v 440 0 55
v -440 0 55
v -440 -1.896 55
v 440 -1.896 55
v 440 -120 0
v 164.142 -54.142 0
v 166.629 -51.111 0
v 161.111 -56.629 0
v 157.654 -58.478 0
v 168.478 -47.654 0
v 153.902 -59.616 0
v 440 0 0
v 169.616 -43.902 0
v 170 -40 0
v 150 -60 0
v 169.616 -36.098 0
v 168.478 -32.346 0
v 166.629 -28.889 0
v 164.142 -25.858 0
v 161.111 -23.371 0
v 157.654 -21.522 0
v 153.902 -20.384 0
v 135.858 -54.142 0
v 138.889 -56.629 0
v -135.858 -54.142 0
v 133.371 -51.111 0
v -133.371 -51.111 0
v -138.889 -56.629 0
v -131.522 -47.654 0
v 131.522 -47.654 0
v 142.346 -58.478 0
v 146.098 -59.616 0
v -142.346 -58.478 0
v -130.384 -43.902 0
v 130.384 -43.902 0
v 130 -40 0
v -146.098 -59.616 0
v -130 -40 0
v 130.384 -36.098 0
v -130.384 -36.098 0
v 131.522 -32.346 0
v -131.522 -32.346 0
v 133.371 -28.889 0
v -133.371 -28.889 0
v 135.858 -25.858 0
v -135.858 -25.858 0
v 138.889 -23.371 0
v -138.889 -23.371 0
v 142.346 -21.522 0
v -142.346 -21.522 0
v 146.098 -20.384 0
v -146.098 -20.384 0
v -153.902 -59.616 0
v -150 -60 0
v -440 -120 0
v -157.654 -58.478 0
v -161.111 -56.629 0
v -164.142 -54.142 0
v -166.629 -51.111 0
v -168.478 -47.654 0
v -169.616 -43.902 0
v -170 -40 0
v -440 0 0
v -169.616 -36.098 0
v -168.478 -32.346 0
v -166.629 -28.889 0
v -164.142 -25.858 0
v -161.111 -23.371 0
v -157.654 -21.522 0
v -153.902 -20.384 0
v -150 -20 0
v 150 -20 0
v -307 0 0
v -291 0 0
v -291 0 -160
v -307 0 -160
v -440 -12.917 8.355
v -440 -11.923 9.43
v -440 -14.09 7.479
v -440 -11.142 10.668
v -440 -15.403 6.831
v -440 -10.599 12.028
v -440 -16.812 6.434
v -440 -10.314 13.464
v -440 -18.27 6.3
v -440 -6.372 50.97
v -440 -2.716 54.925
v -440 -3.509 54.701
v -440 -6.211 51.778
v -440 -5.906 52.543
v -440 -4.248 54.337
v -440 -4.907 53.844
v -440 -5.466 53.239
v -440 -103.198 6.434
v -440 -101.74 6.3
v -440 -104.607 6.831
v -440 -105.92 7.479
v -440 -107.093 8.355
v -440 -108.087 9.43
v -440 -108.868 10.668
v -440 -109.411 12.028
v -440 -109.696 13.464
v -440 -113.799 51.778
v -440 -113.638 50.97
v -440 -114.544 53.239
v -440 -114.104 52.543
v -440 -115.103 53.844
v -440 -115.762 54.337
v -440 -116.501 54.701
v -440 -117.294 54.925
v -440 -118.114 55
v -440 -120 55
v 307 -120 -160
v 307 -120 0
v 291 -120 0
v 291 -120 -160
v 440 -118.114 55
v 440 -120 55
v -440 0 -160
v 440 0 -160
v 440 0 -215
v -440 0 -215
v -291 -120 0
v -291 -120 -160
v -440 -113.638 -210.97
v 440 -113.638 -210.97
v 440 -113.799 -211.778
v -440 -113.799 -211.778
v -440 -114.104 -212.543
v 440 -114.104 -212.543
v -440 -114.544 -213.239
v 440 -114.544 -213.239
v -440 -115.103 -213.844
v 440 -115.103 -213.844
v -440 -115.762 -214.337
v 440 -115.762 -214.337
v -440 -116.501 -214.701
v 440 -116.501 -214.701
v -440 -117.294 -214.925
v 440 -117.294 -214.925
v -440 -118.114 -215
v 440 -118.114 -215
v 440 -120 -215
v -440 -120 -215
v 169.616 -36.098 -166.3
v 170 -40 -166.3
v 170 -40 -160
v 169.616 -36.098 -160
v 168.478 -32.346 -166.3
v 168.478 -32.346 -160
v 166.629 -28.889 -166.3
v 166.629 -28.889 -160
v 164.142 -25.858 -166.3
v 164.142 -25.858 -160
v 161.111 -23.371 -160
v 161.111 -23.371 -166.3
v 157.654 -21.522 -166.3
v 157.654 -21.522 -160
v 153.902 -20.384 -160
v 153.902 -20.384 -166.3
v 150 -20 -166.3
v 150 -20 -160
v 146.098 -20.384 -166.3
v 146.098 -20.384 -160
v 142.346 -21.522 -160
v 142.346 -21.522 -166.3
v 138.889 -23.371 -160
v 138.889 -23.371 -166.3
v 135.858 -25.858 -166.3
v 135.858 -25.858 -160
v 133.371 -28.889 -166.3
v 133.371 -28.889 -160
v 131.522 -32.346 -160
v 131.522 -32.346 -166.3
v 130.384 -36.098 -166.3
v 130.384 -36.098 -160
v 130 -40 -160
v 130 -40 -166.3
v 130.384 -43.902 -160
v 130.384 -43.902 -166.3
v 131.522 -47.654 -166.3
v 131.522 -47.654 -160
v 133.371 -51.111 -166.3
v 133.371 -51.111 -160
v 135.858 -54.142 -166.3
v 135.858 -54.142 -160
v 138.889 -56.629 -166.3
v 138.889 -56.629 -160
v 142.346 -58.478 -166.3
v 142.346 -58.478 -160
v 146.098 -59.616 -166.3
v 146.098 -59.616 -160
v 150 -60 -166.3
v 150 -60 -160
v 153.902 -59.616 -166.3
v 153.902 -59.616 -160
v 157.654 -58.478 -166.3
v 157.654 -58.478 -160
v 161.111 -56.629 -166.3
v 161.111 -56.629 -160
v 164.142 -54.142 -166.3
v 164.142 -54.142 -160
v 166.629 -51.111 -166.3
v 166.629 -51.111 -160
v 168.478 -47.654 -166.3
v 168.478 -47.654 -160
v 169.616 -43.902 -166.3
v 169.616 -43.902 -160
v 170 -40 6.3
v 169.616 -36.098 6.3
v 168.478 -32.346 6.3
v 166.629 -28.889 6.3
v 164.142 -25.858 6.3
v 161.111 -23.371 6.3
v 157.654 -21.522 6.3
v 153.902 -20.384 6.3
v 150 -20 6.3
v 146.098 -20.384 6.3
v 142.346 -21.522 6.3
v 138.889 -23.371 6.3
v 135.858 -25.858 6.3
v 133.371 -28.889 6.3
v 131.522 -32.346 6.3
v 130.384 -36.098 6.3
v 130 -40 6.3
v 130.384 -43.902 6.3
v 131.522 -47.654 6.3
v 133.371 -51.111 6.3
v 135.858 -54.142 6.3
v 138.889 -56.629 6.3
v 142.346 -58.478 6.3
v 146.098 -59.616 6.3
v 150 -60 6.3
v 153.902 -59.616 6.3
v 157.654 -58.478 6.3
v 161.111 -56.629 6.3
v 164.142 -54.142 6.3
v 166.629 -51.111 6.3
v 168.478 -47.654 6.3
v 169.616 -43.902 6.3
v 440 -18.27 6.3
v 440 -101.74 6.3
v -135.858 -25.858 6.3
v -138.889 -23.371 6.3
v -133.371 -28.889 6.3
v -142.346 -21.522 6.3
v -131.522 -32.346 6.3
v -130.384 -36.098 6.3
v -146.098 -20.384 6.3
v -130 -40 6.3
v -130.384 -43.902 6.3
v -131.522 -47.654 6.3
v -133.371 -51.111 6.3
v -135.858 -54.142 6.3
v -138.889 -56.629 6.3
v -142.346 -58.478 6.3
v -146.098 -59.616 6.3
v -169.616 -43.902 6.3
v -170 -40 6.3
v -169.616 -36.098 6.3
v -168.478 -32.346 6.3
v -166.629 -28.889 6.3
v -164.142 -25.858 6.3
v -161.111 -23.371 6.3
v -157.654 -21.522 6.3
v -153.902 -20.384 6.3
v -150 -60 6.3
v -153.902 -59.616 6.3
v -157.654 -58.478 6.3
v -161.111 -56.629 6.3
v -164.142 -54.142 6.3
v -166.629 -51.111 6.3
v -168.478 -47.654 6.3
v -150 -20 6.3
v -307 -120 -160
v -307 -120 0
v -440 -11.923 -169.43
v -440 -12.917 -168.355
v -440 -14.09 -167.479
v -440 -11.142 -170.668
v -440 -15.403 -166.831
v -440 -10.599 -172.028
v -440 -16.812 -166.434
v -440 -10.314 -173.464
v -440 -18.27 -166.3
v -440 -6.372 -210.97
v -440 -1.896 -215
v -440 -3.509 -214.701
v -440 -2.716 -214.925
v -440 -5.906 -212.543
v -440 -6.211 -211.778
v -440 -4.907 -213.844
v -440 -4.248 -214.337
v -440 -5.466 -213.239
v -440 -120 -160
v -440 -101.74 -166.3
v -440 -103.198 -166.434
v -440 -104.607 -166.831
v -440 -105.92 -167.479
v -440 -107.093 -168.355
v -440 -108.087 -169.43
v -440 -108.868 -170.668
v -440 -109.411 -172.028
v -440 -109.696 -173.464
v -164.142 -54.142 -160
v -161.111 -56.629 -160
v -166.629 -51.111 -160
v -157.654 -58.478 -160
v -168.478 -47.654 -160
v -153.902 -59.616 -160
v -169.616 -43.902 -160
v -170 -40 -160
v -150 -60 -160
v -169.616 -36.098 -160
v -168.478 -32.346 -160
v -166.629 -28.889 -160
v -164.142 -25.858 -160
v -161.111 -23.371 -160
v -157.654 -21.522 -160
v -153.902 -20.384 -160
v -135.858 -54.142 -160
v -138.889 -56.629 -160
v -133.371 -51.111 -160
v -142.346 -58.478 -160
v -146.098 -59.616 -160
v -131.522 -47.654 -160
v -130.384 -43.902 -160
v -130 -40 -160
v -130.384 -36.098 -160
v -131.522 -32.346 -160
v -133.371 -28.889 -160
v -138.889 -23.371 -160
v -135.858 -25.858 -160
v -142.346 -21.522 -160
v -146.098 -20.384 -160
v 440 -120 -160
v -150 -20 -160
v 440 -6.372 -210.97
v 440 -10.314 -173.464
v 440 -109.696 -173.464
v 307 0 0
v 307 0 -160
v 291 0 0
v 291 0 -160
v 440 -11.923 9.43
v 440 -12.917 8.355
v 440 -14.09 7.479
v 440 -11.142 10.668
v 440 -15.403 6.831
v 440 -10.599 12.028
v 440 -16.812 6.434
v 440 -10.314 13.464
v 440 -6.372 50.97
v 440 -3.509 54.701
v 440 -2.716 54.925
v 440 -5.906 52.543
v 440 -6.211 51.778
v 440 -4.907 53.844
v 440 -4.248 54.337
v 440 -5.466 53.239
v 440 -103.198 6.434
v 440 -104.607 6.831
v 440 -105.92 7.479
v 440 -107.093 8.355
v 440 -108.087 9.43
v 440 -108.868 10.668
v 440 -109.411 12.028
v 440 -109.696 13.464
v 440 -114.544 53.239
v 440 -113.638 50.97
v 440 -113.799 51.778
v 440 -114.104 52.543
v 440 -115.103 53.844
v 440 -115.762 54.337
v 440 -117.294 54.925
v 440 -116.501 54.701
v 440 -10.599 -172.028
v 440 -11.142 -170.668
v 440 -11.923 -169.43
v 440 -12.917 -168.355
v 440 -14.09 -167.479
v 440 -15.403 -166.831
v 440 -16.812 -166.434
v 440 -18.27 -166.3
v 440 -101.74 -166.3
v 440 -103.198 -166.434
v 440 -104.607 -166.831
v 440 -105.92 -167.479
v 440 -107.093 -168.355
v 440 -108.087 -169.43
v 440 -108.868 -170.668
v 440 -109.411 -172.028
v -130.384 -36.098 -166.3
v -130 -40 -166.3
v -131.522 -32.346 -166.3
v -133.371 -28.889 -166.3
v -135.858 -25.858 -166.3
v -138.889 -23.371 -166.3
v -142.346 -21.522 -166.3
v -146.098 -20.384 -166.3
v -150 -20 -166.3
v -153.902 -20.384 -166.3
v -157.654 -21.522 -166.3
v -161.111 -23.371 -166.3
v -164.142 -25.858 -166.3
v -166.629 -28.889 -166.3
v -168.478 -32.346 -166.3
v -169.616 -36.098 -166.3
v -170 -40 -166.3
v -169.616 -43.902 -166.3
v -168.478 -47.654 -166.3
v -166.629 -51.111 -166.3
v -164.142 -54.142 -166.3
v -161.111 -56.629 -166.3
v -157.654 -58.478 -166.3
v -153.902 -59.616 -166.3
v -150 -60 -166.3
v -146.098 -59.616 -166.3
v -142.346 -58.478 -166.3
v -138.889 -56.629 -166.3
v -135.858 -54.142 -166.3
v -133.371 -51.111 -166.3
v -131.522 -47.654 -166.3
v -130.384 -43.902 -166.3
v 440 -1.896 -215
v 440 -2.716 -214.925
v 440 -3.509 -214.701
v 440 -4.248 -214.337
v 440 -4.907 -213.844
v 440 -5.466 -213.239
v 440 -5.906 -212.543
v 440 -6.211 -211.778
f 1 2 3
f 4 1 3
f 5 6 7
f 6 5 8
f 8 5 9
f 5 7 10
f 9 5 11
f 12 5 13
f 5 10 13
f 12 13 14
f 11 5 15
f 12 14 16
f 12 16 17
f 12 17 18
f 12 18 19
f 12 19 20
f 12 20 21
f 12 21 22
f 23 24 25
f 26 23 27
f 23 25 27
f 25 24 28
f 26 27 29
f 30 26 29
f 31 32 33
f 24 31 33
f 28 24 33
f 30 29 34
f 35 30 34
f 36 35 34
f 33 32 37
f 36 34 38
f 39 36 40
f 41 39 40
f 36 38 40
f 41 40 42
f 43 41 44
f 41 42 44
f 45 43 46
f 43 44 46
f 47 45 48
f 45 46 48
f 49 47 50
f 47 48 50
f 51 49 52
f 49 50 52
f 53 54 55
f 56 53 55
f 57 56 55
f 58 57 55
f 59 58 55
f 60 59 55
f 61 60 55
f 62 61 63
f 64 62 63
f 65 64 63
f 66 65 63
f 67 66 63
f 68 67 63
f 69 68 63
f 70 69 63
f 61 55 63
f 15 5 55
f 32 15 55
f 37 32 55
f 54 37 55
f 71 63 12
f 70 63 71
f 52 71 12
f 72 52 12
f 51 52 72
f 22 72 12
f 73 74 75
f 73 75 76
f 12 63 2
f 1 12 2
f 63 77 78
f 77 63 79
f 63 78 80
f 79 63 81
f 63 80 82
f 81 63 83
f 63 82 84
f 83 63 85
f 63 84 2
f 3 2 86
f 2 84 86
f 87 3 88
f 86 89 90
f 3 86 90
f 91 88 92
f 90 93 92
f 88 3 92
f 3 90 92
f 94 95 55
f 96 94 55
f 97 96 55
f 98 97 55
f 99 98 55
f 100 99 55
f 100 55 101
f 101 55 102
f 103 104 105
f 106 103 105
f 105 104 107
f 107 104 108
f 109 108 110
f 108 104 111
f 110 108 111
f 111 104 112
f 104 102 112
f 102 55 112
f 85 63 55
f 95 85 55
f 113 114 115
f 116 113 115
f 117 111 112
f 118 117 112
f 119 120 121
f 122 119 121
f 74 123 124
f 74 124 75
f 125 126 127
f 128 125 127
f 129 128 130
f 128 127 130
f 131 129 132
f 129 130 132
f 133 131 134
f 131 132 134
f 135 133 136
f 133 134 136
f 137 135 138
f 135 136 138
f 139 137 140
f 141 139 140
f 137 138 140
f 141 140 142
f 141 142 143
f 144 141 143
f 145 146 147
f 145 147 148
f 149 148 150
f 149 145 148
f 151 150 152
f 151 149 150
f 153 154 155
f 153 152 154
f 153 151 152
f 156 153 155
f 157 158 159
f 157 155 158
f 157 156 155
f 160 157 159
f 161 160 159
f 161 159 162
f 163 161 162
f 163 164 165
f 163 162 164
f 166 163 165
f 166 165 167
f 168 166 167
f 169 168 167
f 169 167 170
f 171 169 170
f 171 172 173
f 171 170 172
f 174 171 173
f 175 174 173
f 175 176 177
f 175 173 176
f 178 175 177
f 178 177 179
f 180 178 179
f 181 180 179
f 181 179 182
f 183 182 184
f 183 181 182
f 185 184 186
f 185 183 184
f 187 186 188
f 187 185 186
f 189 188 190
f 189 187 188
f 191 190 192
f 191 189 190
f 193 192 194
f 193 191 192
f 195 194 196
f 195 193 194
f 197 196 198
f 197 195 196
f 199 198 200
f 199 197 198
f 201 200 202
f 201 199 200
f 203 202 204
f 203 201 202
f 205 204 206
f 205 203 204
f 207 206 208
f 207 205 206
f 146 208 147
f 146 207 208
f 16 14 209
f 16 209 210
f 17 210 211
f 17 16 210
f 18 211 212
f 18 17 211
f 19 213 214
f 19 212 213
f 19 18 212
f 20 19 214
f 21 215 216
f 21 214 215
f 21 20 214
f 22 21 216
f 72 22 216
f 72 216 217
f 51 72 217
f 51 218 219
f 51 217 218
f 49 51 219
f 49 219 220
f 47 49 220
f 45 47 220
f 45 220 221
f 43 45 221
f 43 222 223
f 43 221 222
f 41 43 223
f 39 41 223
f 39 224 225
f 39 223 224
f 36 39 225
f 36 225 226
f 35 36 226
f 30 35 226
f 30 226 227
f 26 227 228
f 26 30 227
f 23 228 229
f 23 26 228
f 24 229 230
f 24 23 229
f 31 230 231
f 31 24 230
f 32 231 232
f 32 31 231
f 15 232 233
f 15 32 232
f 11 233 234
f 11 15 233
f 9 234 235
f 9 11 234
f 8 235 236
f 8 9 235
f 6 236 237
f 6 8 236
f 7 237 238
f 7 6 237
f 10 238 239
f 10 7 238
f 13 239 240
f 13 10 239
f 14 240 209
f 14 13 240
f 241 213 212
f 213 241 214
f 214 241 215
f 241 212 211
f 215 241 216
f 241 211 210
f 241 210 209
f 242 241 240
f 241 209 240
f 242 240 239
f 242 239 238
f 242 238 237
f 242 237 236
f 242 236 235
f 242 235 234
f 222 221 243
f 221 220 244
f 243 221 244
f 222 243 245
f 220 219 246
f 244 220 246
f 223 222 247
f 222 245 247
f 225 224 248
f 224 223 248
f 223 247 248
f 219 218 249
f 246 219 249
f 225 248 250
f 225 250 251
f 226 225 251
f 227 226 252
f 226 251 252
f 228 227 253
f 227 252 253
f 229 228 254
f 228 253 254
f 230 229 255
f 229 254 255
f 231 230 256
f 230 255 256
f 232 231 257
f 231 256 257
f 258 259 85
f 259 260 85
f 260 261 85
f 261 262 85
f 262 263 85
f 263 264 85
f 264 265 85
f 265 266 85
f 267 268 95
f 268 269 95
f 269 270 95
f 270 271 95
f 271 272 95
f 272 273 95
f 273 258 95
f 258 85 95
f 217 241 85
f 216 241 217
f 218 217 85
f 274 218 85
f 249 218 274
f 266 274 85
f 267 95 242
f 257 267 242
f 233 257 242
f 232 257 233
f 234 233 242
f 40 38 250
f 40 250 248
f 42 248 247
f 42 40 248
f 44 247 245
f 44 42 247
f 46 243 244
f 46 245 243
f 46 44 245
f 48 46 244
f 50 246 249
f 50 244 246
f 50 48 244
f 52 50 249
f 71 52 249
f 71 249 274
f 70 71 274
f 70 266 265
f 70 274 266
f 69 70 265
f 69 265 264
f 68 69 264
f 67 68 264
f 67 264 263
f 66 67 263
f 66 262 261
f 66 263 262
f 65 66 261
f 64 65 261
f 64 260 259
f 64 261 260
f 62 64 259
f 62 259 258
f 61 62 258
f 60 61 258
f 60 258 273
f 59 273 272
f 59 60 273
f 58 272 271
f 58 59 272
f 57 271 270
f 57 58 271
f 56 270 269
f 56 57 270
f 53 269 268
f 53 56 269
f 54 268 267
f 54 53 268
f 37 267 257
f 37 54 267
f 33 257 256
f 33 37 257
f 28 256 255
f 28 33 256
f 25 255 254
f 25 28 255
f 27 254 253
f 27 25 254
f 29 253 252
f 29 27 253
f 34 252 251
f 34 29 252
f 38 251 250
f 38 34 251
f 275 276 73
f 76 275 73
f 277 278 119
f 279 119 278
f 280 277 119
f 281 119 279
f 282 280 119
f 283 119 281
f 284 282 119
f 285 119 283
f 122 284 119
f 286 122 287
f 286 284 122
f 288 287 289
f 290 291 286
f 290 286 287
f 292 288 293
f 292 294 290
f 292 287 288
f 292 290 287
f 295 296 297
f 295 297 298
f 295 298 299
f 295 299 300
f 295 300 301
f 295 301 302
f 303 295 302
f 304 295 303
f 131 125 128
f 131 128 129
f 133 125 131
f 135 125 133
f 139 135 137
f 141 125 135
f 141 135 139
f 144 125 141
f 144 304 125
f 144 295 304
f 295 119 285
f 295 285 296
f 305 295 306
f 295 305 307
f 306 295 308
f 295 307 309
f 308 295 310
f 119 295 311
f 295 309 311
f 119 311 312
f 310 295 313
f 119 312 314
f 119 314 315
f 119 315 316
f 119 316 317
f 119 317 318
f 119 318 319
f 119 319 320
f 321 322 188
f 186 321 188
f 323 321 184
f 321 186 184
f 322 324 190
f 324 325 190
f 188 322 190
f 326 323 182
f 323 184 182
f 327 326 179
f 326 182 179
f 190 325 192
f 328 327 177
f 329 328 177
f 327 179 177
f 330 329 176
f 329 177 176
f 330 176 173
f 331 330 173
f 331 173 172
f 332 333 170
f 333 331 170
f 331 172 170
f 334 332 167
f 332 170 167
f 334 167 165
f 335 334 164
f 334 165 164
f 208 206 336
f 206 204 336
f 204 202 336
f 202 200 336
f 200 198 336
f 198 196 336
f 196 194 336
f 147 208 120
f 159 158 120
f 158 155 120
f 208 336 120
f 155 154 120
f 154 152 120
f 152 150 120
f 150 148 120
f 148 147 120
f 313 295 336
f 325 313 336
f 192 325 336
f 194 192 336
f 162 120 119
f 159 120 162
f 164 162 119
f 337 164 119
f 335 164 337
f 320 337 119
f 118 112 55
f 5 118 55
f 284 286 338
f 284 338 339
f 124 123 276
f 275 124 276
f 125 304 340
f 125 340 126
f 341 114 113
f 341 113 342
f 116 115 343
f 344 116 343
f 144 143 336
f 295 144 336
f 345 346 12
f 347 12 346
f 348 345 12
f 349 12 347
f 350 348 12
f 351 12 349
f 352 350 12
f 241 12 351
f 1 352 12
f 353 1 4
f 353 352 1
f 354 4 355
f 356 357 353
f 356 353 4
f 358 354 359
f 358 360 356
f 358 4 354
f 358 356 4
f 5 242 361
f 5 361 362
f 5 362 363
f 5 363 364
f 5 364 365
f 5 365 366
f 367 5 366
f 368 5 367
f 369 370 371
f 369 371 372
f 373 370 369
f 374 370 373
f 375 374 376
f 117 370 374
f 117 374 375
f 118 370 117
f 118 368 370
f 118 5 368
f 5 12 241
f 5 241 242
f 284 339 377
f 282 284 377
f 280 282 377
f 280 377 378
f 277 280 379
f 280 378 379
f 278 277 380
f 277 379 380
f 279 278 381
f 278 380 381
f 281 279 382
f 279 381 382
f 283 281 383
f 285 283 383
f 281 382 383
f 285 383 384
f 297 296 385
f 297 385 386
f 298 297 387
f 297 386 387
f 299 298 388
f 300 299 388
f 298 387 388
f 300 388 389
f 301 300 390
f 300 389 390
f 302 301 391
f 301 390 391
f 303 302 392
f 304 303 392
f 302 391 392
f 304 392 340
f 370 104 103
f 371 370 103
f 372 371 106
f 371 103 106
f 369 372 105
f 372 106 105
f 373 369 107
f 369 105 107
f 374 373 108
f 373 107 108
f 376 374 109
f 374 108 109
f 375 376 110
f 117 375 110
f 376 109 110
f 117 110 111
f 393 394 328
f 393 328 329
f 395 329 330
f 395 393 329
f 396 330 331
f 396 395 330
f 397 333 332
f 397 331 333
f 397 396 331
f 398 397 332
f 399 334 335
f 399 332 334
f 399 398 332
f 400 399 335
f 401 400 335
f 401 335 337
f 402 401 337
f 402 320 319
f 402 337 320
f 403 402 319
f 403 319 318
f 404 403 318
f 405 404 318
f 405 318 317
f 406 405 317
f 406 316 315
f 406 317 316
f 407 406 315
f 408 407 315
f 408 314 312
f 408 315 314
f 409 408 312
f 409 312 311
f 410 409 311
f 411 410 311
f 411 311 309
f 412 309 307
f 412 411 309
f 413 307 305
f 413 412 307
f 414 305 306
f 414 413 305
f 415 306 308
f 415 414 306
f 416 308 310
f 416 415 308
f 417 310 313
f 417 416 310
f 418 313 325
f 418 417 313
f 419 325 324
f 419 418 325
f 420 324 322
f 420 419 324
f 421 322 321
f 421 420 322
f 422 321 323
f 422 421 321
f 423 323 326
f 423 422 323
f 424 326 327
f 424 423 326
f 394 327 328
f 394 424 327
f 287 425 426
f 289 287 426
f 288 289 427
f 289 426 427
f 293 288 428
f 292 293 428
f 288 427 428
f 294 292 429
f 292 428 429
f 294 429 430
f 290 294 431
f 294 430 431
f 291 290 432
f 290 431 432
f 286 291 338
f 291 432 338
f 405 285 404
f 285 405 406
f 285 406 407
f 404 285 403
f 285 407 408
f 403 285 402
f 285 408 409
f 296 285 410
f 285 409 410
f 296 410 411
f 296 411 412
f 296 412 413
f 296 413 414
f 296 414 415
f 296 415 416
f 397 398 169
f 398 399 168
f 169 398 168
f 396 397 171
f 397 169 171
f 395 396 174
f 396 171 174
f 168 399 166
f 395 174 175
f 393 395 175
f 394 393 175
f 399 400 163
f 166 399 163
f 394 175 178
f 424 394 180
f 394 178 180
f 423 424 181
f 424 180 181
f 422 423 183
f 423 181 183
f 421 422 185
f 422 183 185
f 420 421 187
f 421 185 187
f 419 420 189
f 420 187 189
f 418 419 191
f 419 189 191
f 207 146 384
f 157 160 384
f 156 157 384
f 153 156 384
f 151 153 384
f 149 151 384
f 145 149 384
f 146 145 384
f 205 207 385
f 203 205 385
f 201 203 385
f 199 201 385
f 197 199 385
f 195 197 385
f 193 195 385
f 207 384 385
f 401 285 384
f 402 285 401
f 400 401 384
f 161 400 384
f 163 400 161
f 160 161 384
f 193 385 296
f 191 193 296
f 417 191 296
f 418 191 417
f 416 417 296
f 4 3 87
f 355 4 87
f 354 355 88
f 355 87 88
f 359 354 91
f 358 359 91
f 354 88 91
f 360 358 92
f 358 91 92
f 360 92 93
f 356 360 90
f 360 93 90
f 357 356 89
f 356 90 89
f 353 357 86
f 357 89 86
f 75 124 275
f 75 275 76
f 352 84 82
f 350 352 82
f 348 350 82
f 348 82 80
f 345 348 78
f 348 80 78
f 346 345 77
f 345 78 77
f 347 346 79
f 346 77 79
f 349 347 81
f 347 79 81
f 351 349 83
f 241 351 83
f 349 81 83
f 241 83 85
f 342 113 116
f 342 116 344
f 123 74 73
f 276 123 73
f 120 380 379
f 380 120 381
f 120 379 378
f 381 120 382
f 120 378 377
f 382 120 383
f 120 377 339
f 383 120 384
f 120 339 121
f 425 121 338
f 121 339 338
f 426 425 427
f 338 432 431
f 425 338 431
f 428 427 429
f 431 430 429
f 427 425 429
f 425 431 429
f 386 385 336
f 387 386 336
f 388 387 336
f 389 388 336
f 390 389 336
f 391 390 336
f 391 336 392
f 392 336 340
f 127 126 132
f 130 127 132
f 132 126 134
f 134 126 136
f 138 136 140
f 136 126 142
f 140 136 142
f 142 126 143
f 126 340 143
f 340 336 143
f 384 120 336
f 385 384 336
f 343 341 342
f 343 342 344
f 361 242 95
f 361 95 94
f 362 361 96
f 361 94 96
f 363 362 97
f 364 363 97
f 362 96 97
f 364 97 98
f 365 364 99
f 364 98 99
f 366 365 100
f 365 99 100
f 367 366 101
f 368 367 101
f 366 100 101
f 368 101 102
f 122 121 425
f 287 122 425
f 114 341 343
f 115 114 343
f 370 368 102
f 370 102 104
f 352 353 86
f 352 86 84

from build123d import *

# Parameters (mm, degrees)
C_CHANNEL_120_X_12_1_DEPTH = 880
C_CHANNEL_120_X_12_2_DEPTH = 880
CUT_EXTRUDE3_DEPTH         = 507.925724342
CUT_EXTRUDE3_DEPTH_BACK    = 507.925724342
SKETCH18_R                 = 20
BOSS_EXTRUDE1_REACH        = 506.207
SKETCH19_W                 = 16
SKETCH19_H                 = 120


with BuildPart() as part:
    # Sketch13 → C channel 120 X 12(1) (new body)
    with BuildSketch(Plane(origin=(-440, 0, 0), x_dir=(0, 0, 1), z_dir=(1, 0, 0))):
        with BuildLine():
            Line((55, 120), (0, 120))
            Line((0, 120), (0, 0))
            Line((0, 0), (55, 0))
            Line((55, 0), (55, 1.896373189))
            ThreePointArc((55, 1.896373189), (53.844151715, 4.907460917), (50.970378085, 6.371721718))
            Line((50.970378085, 6.371721718), (13.463772294, 10.313824837))
            ThreePointArc((13.463772294, 10.313824837), (8.354841396, 12.916955149), (6.3, 18.27))
            Line((6.3, 18.27), (6.3, 101.74))
            ThreePointArc((6.3, 101.74), (8.354841396, 107.093044851), (13.463772294, 109.696175163))
            Line((13.463772294, 109.696175163), (50.970378085, 113.638278282))
            ThreePointArc((50.970378085, 113.638278282), (53.844151715, 115.102539083), (55, 118.113626811))
            Line((55, 118.113626811), (55, 120))
        make_face()
    extrude(amount=C_CHANNEL_120_X_12_1_DEPTH)


with BuildPart() as body_2:
    # Sketch16 → C channel 120 X 12(2) (new body)
    with BuildSketch(Plane(origin=(440, 0, -160), x_dir=(0, 0, -1), z_dir=(-1, 0, 0))):
        with BuildLine():
            Line((55, 120), (0, 120))
            Line((0, 120), (0, 0))
            Line((0, 0), (55, 0))
            Line((55, 0), (55, 1.896373189))
            ThreePointArc((55, 1.896373189), (53.844151715, 4.907460917), (50.970378085, 6.371721718))
            Line((50.970378085, 6.371721718), (13.463772294, 10.313824837))
            ThreePointArc((13.463772294, 10.313824837), (8.354841396, 12.916955149), (6.3, 18.27))
            Line((6.3, 18.27), (6.3, 101.74))
            ThreePointArc((6.3, 101.74), (8.354841396, 107.093044851), (13.463772294, 109.696175163))
            Line((13.463772294, 109.696175163), (50.970378085, 113.638278282))
            ThreePointArc((50.970378085, 113.638278282), (53.844151715, 115.102539083), (55, 118.113626811))
            Line((55, 118.113626811), (55, 120))
        make_face()
    extrude(amount=C_CHANNEL_120_X_12_2_DEPTH)


with BuildPart() as cut_extrude3_tool:
    # Sketch18 → Cut-Extrude3 (new, two sides: drawn at the far end of the back side and taken through both)
    with BuildSketch(Plane.XY.offset(6.3).offset(-CUT_EXTRUDE3_DEPTH_BACK)):
        with Locations((-150, -40)):
            Circle(SKETCH18_R)
        with Locations((150, -40)):
            Circle(SKETCH18_R)
    extrude(amount=CUT_EXTRUDE3_DEPTH + CUT_EXTRUDE3_DEPTH_BACK)


with BuildPart() as part_1:
    add(part.part)

    # Cut-Extrude3: cut by cut_extrude3_tool
    add(cut_extrude3_tool.part, mode=Mode.SUBTRACT)


with BuildPart() as body_2_1:
    add(body_2.part)

    # Cut-Extrude3: cut by cut_extrude3_tool
    add(cut_extrude3_tool.part, mode=Mode.SUBTRACT)


with BuildPart() as body_3:

    # Sketch19 → Boss-Extrude1 (new, up to next)
    with BuildSketch(Plane(origin=(0, 0, 0), x_dir=(-1, 0, 0), z_dir=(0, 0, -1)), mode=Mode.PRIVATE) as boss_extrude1_sk1:
        with Locations((-299, -60)):
            Rectangle(SKETCH19_W, SKETCH19_H)
    boss_extrude1_tool1 = extrude(boss_extrude1_sk1.sketch, amount=BOSS_EXTRUDE1_REACH, mode=Mode.PRIVATE) - body_2_1.part
    # Sketch19 → Boss-Extrude1 (new, up to next)
    with BuildSketch(Plane(origin=(0, 0, 0), x_dir=(-1, 0, 0), z_dir=(0, 0, -1)), mode=Mode.PRIVATE) as boss_extrude1_sk2:
        with Locations((299, -60)):
            Rectangle(SKETCH19_W, SKETCH19_H)
    boss_extrude1_tool2 = extrude(boss_extrude1_sk2.sketch, amount=BOSS_EXTRUDE1_REACH, mode=Mode.PRIVATE) - body_2_1.part
    add(boss_extrude1_tool1.solids().sort_by_distance((299, -60, 0))[0])
    add(boss_extrude1_tool2.solids().sort_by_distance((-299, -60, 0))[0])


solid = Compound([part_1.part, body_2_1.part, body_3.part])
